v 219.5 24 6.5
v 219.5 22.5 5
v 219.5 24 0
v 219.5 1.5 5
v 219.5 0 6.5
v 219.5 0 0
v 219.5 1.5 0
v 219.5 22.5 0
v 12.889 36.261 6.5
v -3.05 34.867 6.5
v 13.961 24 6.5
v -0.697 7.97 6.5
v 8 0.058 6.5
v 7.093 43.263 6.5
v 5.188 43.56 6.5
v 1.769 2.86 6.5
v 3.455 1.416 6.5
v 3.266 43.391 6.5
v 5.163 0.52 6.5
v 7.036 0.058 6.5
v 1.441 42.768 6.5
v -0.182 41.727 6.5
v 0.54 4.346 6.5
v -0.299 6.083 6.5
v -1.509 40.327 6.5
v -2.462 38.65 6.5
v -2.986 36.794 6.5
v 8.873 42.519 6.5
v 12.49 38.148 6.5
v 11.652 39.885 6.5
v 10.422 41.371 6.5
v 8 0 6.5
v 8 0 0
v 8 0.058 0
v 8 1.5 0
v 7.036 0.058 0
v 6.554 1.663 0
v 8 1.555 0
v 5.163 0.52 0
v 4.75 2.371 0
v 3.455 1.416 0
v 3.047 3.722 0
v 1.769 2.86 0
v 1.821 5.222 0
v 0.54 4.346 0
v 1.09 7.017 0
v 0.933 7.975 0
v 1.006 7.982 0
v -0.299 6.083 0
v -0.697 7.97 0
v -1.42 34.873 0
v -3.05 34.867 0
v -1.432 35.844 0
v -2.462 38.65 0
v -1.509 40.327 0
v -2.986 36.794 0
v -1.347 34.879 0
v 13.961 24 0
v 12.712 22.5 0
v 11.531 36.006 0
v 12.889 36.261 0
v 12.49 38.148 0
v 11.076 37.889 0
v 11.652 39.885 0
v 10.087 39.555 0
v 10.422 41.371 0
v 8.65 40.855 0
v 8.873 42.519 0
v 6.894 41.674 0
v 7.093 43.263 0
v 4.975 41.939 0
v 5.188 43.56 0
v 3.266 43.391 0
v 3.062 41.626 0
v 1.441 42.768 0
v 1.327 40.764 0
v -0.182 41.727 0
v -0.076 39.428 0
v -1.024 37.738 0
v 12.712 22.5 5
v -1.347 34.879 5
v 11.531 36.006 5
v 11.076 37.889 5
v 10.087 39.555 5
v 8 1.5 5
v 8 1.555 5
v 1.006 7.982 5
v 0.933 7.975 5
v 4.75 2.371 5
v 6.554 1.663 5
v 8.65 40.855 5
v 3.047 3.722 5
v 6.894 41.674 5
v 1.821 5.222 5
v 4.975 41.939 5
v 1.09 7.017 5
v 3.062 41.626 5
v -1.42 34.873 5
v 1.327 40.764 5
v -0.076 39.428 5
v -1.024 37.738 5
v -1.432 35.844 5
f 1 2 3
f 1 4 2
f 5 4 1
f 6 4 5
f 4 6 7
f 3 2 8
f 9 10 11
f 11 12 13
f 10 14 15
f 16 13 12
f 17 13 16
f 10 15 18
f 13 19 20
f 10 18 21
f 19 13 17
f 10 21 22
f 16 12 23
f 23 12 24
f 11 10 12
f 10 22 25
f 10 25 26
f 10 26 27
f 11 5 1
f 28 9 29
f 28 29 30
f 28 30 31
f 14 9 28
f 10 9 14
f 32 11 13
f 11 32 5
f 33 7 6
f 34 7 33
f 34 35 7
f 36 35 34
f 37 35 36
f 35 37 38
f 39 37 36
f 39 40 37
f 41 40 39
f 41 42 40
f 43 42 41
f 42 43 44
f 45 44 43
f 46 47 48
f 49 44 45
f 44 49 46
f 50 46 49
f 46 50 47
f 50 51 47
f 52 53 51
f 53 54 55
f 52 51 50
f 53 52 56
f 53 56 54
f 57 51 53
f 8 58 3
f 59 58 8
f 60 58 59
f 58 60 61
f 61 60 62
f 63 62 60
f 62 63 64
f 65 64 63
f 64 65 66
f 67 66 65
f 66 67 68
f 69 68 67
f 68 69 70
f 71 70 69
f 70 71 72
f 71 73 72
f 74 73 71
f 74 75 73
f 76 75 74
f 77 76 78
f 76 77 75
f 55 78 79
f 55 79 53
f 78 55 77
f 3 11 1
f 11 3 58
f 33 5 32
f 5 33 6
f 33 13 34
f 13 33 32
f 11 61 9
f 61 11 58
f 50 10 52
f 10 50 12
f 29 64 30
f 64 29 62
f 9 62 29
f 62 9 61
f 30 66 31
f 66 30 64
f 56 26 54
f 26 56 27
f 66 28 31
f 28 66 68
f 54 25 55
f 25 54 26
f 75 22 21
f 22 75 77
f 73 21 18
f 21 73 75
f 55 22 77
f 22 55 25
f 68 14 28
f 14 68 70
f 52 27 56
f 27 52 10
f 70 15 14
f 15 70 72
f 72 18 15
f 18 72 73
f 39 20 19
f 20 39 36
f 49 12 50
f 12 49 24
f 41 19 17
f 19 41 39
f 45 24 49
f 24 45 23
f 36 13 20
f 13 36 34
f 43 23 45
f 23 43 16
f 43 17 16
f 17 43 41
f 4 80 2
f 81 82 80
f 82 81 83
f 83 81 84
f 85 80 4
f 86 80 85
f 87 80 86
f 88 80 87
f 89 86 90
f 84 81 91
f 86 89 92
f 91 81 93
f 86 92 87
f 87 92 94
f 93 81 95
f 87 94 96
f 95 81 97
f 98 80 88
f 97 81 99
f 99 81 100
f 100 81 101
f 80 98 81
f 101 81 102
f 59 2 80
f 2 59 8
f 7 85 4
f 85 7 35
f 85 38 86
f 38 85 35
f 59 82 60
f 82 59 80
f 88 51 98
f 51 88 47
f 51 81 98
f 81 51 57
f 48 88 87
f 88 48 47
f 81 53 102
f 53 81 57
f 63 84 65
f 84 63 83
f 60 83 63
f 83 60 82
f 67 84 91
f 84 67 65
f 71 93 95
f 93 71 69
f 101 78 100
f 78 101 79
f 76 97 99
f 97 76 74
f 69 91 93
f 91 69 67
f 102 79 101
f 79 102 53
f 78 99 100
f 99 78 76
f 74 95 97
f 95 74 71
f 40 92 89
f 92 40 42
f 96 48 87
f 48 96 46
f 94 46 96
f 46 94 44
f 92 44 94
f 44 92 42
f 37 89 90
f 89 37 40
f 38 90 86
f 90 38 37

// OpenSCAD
module side_cover_inner(
    length,
    height,
    width,
    overflow_height, 
    overflow_width,
    overflow_angle,
    thickness
){
    t = thickness;
    q = overflow_height+t-overflow_width/2;
    r = overflow_width/2+t;
    difference(){
        cube([length+t, height+2*t, width]);
        cube([overflow_width+2*t, overflow_width+2*t, 2*width], center = true);
    }
    rotate([0,0,overflow_angle]){
        translate([0,r, 0])
            cube([overflow_width+2*t, q-r, width]);
        translate([overflow_width/2+t, q, 0])
            cylinder(h=width, r=overflow_width/2+t);
    }
    hull(){
        translate([r, r, 0])
            cylinder(h=width, r=r);
        rotate([0,0,overflow_angle])
            translate([r, r, 0])
                cylinder(h=width, r=r);
    }
}

module side_cover(
    length,
    height,
    side_overlap_width,
    overflow_height, 
    overflow_width,
    overflow_angle,
    thickness
){
    difference(){
        side_cover_inner(length,
        height,
        side_overlap_width+thickness,
        overflow_height, 
        overflow_width,
        overflow_angle,
        thickness);
        translate([thickness, thickness, 0])   
            side_cover_inner(length,
            height,
            side_overlap_width,
            overflow_height, 
            overflow_width,
            overflow_angle,
            0);
    }
}



side_cover(218, 21, 5, 40, 13, 5, 1.5);
